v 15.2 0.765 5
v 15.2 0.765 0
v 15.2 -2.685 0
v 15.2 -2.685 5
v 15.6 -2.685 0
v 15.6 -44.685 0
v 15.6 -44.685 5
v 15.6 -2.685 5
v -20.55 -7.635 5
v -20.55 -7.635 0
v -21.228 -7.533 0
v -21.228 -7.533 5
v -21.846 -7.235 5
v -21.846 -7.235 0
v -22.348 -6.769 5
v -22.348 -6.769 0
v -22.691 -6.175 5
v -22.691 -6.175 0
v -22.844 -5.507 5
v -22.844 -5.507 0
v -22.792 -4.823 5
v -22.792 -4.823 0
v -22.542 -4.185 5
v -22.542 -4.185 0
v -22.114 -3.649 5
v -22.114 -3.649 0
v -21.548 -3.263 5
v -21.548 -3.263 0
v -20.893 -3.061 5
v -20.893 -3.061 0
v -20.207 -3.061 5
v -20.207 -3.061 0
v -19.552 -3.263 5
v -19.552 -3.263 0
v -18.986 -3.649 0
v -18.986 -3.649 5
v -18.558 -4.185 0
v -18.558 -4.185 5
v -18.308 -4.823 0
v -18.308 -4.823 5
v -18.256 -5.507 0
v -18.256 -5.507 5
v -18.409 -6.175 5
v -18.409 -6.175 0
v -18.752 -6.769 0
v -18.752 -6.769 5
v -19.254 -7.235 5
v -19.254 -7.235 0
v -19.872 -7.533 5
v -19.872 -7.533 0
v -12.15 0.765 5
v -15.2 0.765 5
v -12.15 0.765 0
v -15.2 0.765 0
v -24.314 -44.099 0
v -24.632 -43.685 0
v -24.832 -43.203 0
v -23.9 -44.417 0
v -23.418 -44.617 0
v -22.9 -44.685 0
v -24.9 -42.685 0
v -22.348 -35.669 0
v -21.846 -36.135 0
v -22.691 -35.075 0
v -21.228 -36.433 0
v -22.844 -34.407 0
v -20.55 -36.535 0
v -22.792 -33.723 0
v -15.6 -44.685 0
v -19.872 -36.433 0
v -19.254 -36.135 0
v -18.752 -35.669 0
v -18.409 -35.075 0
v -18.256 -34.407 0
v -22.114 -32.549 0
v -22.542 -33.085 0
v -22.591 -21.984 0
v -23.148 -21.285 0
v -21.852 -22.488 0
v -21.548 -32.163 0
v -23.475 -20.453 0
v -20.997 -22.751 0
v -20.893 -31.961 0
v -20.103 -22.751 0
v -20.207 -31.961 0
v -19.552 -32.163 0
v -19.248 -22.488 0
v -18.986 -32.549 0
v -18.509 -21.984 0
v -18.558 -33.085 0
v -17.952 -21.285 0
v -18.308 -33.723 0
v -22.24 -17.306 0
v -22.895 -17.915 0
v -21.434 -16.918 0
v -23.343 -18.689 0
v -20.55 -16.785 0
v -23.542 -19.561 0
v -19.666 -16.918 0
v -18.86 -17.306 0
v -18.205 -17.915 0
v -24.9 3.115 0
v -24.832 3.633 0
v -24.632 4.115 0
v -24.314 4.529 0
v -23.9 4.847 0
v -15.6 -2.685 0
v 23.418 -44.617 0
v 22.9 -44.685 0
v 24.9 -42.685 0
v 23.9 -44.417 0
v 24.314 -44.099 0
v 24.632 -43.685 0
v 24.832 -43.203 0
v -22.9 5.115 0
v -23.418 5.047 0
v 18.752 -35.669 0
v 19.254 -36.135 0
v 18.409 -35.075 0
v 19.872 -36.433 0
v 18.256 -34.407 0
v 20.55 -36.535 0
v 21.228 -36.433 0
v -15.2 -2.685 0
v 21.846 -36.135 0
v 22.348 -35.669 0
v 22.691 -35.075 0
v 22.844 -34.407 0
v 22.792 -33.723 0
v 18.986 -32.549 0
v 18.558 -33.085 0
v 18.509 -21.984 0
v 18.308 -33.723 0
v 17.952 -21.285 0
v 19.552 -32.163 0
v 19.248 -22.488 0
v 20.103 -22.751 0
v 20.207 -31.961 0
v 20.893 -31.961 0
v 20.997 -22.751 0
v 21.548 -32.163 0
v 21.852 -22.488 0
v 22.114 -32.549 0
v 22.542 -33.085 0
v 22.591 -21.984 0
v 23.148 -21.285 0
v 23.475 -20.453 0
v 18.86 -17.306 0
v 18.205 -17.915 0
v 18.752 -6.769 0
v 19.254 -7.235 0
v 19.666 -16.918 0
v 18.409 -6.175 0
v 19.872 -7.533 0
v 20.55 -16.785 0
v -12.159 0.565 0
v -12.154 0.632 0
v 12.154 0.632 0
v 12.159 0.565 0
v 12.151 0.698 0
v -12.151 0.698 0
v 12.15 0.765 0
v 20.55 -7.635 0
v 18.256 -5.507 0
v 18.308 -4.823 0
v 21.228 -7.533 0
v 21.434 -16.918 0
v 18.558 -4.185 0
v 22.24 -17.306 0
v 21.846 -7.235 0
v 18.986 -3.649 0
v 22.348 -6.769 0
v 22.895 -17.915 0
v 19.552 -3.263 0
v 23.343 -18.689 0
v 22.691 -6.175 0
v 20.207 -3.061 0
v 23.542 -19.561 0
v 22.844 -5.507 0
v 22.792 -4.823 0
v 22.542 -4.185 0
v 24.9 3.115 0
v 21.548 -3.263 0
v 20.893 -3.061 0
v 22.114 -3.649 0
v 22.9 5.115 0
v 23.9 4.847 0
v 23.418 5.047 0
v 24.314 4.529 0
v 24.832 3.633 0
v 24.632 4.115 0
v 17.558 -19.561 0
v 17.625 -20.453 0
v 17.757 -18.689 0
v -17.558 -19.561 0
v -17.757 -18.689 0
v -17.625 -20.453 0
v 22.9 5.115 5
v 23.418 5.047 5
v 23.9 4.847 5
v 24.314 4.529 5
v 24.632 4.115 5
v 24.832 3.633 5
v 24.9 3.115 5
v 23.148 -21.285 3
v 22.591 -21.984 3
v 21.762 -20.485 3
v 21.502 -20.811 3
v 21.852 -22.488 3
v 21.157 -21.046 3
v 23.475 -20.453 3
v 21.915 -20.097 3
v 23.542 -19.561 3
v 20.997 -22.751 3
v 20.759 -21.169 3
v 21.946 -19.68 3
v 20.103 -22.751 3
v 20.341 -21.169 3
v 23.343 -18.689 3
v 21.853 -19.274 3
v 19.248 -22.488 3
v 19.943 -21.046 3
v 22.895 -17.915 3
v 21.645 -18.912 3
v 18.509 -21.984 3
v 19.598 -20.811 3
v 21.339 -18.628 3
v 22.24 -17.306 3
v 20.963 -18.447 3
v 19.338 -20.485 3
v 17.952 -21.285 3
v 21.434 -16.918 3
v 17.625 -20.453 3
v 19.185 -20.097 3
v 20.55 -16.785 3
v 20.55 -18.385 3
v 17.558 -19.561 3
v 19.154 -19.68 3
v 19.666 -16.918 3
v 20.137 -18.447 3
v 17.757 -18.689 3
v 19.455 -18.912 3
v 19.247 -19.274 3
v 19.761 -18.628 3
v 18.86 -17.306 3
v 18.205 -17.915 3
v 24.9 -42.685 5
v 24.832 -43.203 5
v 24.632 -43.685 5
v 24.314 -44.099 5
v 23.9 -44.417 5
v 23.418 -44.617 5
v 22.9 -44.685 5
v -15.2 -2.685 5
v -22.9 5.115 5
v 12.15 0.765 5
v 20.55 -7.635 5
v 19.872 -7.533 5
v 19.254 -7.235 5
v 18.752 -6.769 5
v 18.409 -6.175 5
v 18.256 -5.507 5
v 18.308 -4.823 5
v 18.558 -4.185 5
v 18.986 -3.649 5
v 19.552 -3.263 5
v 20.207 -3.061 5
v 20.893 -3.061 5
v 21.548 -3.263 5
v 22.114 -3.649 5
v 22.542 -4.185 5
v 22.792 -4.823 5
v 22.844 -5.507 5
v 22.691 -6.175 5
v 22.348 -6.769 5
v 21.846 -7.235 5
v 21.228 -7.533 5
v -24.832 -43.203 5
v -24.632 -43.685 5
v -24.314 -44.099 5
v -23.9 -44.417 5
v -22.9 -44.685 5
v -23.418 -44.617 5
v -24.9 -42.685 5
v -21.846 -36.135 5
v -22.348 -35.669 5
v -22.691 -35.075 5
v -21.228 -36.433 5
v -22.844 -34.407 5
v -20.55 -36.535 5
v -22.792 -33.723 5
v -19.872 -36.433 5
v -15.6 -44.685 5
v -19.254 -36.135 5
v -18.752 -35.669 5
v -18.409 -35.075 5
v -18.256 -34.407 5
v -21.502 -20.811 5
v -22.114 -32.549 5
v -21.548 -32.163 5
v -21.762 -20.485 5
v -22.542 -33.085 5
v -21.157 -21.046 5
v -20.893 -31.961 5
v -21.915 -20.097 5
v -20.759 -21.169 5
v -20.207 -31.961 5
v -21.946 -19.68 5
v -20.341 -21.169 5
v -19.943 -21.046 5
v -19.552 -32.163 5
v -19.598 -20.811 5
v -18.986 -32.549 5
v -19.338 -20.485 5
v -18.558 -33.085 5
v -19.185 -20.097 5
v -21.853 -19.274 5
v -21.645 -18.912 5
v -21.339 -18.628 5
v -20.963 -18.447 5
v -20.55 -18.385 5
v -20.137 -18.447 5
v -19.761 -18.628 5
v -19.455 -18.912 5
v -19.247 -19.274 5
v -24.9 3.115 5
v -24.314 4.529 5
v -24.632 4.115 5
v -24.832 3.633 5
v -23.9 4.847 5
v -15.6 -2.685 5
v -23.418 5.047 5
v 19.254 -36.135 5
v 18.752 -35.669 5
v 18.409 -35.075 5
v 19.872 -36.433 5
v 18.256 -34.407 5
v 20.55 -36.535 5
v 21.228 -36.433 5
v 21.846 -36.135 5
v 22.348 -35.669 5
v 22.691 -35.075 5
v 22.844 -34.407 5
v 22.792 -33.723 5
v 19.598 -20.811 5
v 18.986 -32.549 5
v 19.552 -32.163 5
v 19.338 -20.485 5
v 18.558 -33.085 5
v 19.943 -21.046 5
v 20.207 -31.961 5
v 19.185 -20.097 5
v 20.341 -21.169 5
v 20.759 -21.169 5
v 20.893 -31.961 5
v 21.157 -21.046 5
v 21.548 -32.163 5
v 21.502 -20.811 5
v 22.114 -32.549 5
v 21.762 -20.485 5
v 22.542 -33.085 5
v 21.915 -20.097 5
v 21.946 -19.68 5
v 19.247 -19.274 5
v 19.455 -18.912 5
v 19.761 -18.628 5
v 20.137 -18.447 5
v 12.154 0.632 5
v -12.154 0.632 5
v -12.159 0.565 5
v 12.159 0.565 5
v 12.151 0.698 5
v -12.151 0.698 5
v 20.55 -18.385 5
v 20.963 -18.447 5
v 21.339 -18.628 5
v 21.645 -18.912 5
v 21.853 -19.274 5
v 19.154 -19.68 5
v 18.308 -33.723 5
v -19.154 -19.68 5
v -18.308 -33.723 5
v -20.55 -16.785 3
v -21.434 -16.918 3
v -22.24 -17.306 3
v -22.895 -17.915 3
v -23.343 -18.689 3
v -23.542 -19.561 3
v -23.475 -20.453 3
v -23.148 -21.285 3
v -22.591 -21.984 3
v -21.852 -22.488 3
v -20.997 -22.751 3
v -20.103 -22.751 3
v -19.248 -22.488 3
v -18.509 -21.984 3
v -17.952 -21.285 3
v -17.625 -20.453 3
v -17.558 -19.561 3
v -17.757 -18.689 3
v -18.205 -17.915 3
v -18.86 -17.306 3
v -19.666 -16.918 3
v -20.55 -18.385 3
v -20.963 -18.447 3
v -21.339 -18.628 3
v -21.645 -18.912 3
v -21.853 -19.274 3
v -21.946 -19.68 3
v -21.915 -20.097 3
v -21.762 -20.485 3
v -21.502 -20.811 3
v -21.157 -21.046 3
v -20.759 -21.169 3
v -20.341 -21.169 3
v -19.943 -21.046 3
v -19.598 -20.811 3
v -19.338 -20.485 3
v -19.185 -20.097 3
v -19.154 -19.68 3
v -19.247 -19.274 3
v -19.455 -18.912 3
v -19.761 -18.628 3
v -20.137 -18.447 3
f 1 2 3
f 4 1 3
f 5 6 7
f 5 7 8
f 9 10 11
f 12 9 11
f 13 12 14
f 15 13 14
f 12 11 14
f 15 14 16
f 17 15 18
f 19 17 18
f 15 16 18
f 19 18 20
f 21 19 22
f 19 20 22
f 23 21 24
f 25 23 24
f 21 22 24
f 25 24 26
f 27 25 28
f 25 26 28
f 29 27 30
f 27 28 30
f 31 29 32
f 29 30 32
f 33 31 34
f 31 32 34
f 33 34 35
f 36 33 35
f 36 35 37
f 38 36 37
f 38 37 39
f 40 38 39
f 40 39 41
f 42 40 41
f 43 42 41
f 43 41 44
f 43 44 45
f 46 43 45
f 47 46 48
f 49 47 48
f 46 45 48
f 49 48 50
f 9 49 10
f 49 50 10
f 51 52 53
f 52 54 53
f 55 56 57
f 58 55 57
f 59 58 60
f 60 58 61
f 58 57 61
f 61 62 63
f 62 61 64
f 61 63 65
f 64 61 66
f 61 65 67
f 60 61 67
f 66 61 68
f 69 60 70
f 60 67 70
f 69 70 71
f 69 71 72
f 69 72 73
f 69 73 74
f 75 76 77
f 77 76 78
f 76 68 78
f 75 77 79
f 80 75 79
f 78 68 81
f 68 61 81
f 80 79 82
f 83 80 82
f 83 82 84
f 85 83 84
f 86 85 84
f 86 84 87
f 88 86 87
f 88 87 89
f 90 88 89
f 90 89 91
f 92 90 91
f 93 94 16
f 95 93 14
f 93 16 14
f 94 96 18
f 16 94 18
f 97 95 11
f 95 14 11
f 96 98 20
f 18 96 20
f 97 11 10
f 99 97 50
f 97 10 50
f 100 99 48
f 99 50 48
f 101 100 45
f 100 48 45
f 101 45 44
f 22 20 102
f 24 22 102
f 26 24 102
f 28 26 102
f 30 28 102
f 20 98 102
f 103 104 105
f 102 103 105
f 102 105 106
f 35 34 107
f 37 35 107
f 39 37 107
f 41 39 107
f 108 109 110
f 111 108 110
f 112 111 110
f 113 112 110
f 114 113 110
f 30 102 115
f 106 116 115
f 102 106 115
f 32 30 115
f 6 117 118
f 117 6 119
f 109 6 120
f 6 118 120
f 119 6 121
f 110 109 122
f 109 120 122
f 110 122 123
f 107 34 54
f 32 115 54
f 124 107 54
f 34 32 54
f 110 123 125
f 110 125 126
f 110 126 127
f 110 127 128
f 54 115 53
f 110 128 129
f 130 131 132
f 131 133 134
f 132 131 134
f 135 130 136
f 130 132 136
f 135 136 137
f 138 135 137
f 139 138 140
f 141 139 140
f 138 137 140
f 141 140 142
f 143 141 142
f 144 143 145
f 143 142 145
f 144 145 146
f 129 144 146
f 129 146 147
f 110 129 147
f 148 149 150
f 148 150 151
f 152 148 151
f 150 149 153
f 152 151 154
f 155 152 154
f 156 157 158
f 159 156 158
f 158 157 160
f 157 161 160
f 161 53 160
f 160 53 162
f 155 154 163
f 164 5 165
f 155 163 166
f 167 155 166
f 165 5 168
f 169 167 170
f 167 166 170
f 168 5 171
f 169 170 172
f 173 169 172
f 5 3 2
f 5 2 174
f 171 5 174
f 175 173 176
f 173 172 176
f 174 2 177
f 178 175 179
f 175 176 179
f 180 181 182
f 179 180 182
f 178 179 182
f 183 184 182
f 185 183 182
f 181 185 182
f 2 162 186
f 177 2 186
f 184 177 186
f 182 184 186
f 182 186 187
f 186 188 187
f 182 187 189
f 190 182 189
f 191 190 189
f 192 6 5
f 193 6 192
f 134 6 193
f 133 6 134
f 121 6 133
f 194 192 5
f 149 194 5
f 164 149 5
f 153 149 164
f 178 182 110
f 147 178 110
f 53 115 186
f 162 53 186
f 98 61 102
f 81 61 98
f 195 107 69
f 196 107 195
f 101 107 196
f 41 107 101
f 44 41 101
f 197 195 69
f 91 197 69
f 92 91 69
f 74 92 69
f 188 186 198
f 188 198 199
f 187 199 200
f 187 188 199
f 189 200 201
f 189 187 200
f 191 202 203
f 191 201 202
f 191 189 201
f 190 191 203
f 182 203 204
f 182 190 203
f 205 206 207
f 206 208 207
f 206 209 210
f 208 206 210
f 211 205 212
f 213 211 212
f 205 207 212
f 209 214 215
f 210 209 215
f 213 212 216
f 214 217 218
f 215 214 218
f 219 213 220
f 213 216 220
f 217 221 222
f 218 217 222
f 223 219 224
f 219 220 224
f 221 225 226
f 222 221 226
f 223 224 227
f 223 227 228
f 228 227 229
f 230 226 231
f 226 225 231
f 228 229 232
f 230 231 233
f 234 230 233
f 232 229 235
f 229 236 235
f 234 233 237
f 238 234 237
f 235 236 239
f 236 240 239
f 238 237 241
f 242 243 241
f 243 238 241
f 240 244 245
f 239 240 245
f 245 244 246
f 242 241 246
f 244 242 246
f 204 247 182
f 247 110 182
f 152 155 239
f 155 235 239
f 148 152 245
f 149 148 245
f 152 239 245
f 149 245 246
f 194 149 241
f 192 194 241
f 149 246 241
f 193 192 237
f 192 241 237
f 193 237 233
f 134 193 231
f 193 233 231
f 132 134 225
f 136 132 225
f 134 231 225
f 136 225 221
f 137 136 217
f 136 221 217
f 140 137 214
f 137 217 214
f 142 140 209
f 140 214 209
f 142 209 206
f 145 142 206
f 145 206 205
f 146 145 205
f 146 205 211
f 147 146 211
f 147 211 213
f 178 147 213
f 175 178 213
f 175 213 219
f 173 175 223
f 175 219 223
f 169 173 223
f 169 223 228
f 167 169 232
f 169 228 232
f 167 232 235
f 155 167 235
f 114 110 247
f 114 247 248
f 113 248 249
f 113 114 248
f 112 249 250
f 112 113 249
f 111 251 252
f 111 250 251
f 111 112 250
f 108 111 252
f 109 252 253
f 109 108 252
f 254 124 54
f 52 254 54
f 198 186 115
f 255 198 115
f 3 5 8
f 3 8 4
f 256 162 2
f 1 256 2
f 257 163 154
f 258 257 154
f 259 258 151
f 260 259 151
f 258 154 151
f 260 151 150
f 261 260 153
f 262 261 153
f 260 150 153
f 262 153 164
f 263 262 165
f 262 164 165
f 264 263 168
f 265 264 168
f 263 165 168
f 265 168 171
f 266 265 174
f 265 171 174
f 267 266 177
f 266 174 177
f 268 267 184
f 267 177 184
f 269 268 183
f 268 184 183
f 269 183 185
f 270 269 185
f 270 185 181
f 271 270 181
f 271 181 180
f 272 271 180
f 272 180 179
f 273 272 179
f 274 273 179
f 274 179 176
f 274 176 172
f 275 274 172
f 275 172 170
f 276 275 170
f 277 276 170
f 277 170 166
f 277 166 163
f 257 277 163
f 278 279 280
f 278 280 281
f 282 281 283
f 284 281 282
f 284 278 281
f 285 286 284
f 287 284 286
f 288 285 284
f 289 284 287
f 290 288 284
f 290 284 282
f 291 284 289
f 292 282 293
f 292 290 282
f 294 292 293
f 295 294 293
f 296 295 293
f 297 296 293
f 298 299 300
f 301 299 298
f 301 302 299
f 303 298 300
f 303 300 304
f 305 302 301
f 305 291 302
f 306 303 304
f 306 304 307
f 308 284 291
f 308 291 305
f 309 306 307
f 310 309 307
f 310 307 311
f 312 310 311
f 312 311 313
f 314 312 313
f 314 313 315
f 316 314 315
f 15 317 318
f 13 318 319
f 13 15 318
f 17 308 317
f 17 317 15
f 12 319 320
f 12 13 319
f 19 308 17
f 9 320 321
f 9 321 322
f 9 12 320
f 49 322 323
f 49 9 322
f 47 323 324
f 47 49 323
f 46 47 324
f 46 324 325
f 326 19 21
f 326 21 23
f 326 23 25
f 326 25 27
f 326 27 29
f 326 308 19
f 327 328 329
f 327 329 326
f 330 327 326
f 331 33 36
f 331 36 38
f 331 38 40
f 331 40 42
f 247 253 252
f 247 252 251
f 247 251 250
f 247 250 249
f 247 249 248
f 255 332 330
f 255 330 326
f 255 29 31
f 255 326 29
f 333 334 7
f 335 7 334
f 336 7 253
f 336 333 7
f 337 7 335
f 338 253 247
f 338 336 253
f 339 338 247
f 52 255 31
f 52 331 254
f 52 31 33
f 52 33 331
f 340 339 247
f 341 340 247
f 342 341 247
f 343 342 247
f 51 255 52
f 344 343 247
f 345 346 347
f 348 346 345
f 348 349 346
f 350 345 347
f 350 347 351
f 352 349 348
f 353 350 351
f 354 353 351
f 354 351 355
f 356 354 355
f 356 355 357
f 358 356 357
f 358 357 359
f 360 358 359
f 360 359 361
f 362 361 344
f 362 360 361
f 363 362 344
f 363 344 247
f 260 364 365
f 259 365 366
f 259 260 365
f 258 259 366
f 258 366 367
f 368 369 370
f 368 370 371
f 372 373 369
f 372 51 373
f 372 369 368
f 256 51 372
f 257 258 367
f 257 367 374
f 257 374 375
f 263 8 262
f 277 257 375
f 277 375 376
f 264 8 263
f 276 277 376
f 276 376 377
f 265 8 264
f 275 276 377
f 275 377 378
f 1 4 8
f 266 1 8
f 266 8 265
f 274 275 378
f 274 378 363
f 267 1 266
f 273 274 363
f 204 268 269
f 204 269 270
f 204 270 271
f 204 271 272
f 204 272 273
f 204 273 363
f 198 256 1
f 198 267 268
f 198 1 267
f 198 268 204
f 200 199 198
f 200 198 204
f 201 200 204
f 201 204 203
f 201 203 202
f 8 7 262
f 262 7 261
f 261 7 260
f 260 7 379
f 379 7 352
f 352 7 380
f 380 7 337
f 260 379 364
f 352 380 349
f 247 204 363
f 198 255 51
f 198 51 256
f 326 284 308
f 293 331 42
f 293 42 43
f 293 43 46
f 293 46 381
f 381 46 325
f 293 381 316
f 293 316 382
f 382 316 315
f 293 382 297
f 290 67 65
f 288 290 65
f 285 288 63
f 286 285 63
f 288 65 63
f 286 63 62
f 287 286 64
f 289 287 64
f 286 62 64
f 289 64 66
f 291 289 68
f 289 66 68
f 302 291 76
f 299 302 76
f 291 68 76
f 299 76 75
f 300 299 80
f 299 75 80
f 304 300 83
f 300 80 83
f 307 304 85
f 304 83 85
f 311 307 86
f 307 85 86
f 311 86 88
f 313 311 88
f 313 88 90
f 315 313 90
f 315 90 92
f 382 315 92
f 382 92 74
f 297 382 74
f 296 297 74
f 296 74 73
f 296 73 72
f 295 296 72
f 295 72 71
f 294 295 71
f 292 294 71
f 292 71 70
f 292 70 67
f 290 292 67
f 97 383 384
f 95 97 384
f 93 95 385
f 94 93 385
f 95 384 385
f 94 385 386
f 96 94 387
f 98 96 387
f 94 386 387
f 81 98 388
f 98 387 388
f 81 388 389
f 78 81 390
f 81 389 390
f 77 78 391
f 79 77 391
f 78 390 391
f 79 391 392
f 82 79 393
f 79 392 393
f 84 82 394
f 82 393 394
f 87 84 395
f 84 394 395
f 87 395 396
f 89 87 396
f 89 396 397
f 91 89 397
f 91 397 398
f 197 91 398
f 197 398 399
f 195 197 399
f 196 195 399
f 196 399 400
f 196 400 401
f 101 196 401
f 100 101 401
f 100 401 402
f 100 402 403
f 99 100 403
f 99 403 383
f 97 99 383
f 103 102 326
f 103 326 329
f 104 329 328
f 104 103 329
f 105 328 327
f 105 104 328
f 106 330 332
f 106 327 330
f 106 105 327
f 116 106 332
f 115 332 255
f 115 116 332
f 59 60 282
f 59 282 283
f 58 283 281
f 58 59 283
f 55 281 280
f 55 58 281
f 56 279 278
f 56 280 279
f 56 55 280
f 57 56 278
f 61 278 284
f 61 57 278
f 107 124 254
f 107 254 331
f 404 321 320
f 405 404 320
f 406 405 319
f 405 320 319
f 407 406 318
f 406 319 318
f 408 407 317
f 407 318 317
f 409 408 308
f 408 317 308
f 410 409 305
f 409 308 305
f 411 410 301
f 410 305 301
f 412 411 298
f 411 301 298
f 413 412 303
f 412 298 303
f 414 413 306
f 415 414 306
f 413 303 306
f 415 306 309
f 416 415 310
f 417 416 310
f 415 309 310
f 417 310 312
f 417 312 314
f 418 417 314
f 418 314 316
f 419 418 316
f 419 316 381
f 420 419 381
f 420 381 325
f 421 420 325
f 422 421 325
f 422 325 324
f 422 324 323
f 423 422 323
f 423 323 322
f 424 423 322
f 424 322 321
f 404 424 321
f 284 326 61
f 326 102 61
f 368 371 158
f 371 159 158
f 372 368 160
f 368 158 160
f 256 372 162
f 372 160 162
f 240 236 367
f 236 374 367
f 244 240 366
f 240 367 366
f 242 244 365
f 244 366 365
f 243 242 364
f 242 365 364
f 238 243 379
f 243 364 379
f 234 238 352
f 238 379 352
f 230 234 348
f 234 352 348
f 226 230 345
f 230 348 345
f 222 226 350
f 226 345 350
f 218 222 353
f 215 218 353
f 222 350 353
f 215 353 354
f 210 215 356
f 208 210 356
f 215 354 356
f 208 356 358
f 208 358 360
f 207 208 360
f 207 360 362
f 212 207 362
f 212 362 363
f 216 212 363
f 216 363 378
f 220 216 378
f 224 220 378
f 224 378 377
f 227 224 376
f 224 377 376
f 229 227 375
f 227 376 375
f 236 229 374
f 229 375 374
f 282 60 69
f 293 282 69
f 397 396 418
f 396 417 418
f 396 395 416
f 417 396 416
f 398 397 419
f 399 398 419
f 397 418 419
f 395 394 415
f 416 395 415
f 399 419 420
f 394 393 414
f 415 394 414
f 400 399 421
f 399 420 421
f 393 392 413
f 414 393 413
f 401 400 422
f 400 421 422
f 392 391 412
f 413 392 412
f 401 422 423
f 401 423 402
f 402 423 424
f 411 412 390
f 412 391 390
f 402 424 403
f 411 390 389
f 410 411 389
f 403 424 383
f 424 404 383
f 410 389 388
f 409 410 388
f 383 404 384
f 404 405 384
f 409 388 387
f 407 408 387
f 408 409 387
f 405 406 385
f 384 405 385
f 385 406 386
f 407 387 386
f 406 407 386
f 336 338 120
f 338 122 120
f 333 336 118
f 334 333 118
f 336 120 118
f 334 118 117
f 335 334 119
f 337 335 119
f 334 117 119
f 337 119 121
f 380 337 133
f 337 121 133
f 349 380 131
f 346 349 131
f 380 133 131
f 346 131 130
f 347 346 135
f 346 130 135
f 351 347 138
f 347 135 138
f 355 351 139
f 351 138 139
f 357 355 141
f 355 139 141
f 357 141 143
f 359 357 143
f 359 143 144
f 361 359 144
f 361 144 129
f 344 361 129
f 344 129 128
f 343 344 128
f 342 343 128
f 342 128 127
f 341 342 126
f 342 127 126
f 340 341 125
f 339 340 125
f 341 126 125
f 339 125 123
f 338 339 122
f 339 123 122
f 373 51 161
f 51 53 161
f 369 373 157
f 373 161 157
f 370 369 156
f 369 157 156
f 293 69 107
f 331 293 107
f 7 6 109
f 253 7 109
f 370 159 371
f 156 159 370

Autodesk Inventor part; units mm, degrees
ref_plane "YZ Plane" through (0, 0, 0) normal (1, 0, 0) x (0, 1, 0)
ref_plane "XZ Plane" through (0, 0, 0) normal (0, 1, 0) x (-1, 0, 0)
ref_plane "XY Plane" through (0, 0, 0) normal (0, 0, 1) x (1, 0, 0)
sketch "Sketch1" plane through (0, 0, 0) normal (0, 0, 1) x (1, 0, 0)
  circle A0 centre (-21, 1.215) radius 1.4 projected
  circle A1 centre (21, 1.215) radius 1.4 projected
  arc A2 (24.9, 3.115) -> (22.9, 5.115) centre (22.9, 3.115) ccw projected
  line L0 (22.9, 5.115) -> (-22.9, 5.115) projected
  arc A3 (-22.9, 5.115) -> (-24.9, 3.115) centre (-22.9, 3.115) ccw projected
  line L1 (-24.9, 3.115) -> (-24.9, -5.115) projected
  line L2 (22.8395, -5.115) -> (24.9, -5.115) projected
  line L3 (24.9, -5.115) -> (24.9, 3.115) projected
  arc A4 (22.9, -44.685) -> (24.9, -42.685) centre (22.9, -42.685) ccw projected
  line L4 (24.9, -42.685) -> (24.9, -36.885) projected
  line L5 (24.9, -36.885) -> (17.1, -36.885) projected
  line L6 (17.1, -36.885) -> (17.1, -44.685) projected
  line L7 (17.1, -44.685) -> (22.9, -44.685) projected
  circle A5 centre (21, -40.785) radius 1.4 projected
  arc A6 (-24.9, -42.685) -> (-22.9, -44.685) centre (-22.9, -42.685) ccw projected
  line L8 (-22.9, -44.685) -> (-17.1, -44.685) projected
  line L9 (-17.1, -44.685) -> (-17.1, -36.885) projected
  line L10 (-17.1, -36.885) -> (-24.9, -36.885) projected
  line L11 (-24.9, -36.885) -> (-24.9, -42.685) projected
  circle A7 centre (-21, -40.785) radius 1.4 projected
  line L12 (24.9, 5.115) -> (-24.9, 5.115)
  line L13 (-24.9, 5.115) -> (-24.9, -44.685)
  line L14 (-24.9, -44.685) -> (24.9, -44.685)
  line L15 (24.9, -44.685) -> (24.9, 5.115)
  line L16 (17.1, -2.685) -> (-17.1, -2.685)
  line L17 (-17.1, -2.685) -> (-17.1, -36.885)
  line L18 (-17.1, -36.885) -> (17.1, -36.885)
  line L19 (17.1, -36.885) -> (17.1, -2.685)
  line L20 (17.1, -36.885) -> (17.1, -44.685)
  line L21 (-17.1, -36.885) -> (-17.1, -44.685)
  circle A8 centre (0, 1.415) radius 1.4 projected
  arc A9 (-18.2605, -5.115) -> (-22.8395, -5.115) centre (-20.55, -5.335) ccw projected
  arc A10 (22.8395, -5.115) -> (18.2605, -5.115) centre (20.55, -5.335) ccw projected
  circle A11 centre (14.45, 0.765) radius 2.3 projected
  circle A12 centre (-14.45, 0.765) radius 2.3 projected
  line L22 (-24.9, -5.115) -> (-22.8395, -5.115) projected
  line L23 (-18.2605, -5.115) -> (18.2605, -5.115) projected
  circle A13 centre (20, -39.785) radius 1.4 projected
  circle A14 centre (-20, -39.785) radius 1.4 projected
  circle A15 centre (-14.45, -40.335) radius 2.3 projected
  circle A16 centre (20.55, -34.235) radius 2.3 projected
  circle A17 centre (-20.55, -34.235) radius 2.3 projected
  circle A18 centre (14.45, -40.335) radius 2.3 projected
  arc A19 (22.9, -44.685) -> (24.9, -42.685) centre (22.9, -42.685) ccw projected
  line L24 (24.9, -42.685) -> (24.9, -4.885) projected
  line L25 (24.9, -4.885) -> (22.8055, -4.885) projected
  line L26 (17.1, -4.885) -> (17.1, -36.885) projected
  line L27 (17.1, -36.885) -> (-17.1, -36.885) projected
  line L28 (-17.1, -36.885) -> (-17.1, -4.885) projected
  line L29 (-22.8055, -4.885) -> (-24.9, -4.885) projected
  line L30 (-24.9, -4.885) -> (-24.9, -42.685) projected
  arc A20 (-24.9, -42.685) -> (-22.9, -44.685) centre (-22.9, -42.685) ccw projected
  line L31 (-22.9, -44.685) -> (22.9, -44.685) projected
  arc A21 (-22.8055, -4.885) -> (-18.2945, -4.885) centre (-20.55, -5.335) ccw projected
  arc A22 (18.2945, -4.885) -> (22.8055, -4.885) centre (20.55, -5.335) ccw projected
  line L32 (18.2945, -4.885) -> (17.1, -4.885) projected
  line L33 (-17.1, -4.885) -> (-18.2945, -4.885) projected
  line L34 (17.1, -44.685) -> (15.6, -44.685)
  line L35 (15.6, -44.685) -> (15.6, -2.685)
  line L36 (15.6, -2.685) -> (17.1, -2.685)
  line L37 (17.1, -2.685) -> (17.1, -44.685)
  line L38 (-17.1, -44.685) -> (-15.6, -44.685)
  line L39 (-15.6, -44.685) -> (-15.6, -2.685)
  line L40 (-15.6, -2.685) -> (-17.1, -2.685)
  line L41 (-17.1, -2.685) -> (-17.1, -44.685)
  line L42 (-15, -27.435) -> (15, -27.435) projected
  line L43 (15, -27.435) -> (15, 0.565) projected
  line L44 (15, 0.565) -> (-15, 0.565) projected
  line L45 (-15, 0.565) -> (-15, -27.435) projected
  circle A23 centre (0, -19.785) radius 6.5 projected
  circle A24 centre (-10, -2.435) radius 2.75 projected
  circle A25 centre (10, -2.435) radius 2.75 projected
  line L46 (15.2, 0.765) -> (15.2, -27.635)
  line L47 (15.2, -27.635) -> (-15.2, -27.635)
  line L48 (-15.2, -27.635) -> (-15.2, 0.765)
  line L49 (-15.2, 0.765) -> (15.2, 0.765)
  point P0 (0, 0)
  point P1 (-20.55, -5.335)
  point P2 (20.55, -5.335)
  point P3 (-20.55, -5.335)
  point P4 (20.55, -5.335)
  point P5 (15.2, -2.685)
  point P6 (-15.2, -2.685)
  point P7 (-12.15, 0.765)
  point P8 (-12.1587, 0.565)
  point P9 (12.1587, 0.565)
  point P10 (12.15, 0.765)
  point P11 (-15.6, -36.885)
  point P12 (15.6, -36.885)
  dimension "d0" = 7.8
  dimension "d23" = 1.5
  dimension "d24" = 1.5
  dimension "d57" = 0.2
extrude "Extrusion1" add sketch "Sketch1" along normal blind 5 contours A0 | A1 | L3 L25 A10 L32 L19 L16 L46 A11 L49 A8 A12 L48 L17 L33 A9 L29 L1 A3 L0 A2 | L3 L2 A10 L25 | L15 L5 L19 L23 A22 L2 | A10 A22 | L4 A4 L7 L6 L5 | A10 L23 L19 L32 | L29 A9 L22 L1 | L6 L14 L35 A18 L18 | L18 L35 L23 L19 | L19 L23 L35 L16 | L22 A21 L23 L17 L10 L13 | A9 A21 | L10 L9 L8 A6 L11 | L33 L17 L23 A9 | L39 A15 L14 L9 L18 | L18 L17 L23 L39 | A18 L35 | L17 L16 L39 L23 | L39 A15 | L46 L49 A11 | A12 L49 L48 | L44 A8 L49 A11 | L49 A8 L44 A12 | L44 A8 L49 | L49 A8 | A5 A13 | A13 A5 | A5 A13 | A7 A14 | A7 A14 | A14 A7 | A16 | A17 picked at (16.0467, -40.1174) picked at (-15.7428, -39.7773)
ref_plane "Arbeitsebene1" through (15.3065, -4.4785, 13.1) normal (0, 0, 1) x (0, 1, 0)
sketch "Skizze3" plane through (15.3065, -4.4785, 13.1) normal (0, 0, 1) x (0, 1, 0)
  line L0 (-0.0065, 32.6065) -> (-30.6065, 32.6065) projected
  arc A0 (1.9935, 30.6065) -> (-0.0065, 32.6065) centre (-0.0065, 30.6065) ccw projected
  line L1 (1.9935, 30.6065) -> (1.9935, 0.0065) projected
  arc A1 (-0.0065, -1.9935) -> (1.9935, 0.0065) centre (-0.0065, 0.0065) ccw projected
  line L2 (-0.0065, -1.9935) -> (-30.6065, -1.9935) projected
  arc A2 (-32.6065, 0.0065) -> (-30.6065, -1.9935) centre (-30.6065, 0.0065) ccw projected
  line L3 (-32.6065, 0.0065) -> (-32.6065, 30.6065) projected
  arc A3 (-30.6065, 32.6065) -> (-32.6065, 30.6065) centre (-30.6065, 30.6065) ccw projected
  circle A4 centre (-35.2065, 35.2065) radius 2.4 projected
  circle A5 centre (-35.8565, 29.7565) radius 2.45 projected
  circle A6 centre (-29.7565, 35.8565) radius 2.45 projected
  circle A7 centre (-35.2065, -4.5935) radius 2.4 projected
  circle A8 centre (-35.8565, 0.8565) radius 2.45 projected
  circle A9 centre (-29.7565, -5.2435) radius 2.45 projected
  circle A10 centre (4.5935, 35.2065) radius 2.4 projected
  circle A11 centre (5.2435, 29.7565) radius 2.45 projected
  circle A12 centre (-0.8565, 35.8565) radius 2.45 projected
  circle A13 centre (-0.8565, -5.2435) radius 2.45 projected
  circle A14 centre (5.2435, 0.8565) radius 2.45 projected
  circle A15 centre (4.5935, -4.5935) radius 2.4 projected
  line L4 (-10.3065, -9.6935) -> (7.6935, -9.6935) projected
  arc A16 (7.6935, -9.6935) -> (9.6935, -7.6935) centre (7.6935, -7.6935) ccw projected
  line L5 (9.6935, 10.3065) -> (9.6935, -7.6935) projected
  line L6 (9.6935, 10.3065) -> (10.5197, 10.3065) projected
  arc A17 (10.9935, 9.9665) -> (10.5197, 10.3065) centre (10.5197, 9.8065) ccw projected
  arc A18 (10.9935, 9.9665) -> (12.953, 8.3665) centre (12.953, 10.3665) ccw projected
  line L7 (12.953, 8.3665) -> (13.0935, 8.3665) projected
  arc A19 (13.0935, 8.3665) -> (15.0935, 10.3665) centre (13.0935, 10.3665) ccw projected
  line L8 (15.0935, 10.3665) -> (15.0935, 20.2465) projected
  arc A20 (15.0935, 20.2465) -> (13.0935, 22.2465) centre (13.0935, 20.2465) ccw projected
  line L9 (13.0935, 22.2465) -> (12.953, 22.2465) projected
  arc A21 (12.953, 22.2465) -> (10.9935, 20.6465) centre (12.953, 20.2465) ccw projected
  arc A22 (10.5197, 20.3065) -> (10.9935, 20.6465) centre (10.5197, 20.8065) ccw projected
  line L10 (10.5197, 20.3065) -> (9.6935, 20.3065) projected
  line L11 (9.6935, 38.3065) -> (9.6935, 20.3065) projected
  arc A23 (9.6935, 38.3065) -> (7.6935, 40.3065) centre (7.6935, 38.3065) ccw projected
  line L12 (7.6935, 40.3065) -> (-10.156, 40.3065) projected
  line L13 (-10.156, 40.3065) -> (-10.1563, 39.5805) projected
  arc A24 (-10.1563, 39.5805) -> (-9.9265, 39.2516) centre (-9.8062, 39.5805) ccw projected
  arc A25 (-8.2165, 37.1473) -> (-9.9265, 39.2516) centre (-10.3665, 37.1472) ccw projected
  line L14 (-8.2165, 37.1473) -> (-8.2165, 37.007) projected
  arc A26 (-10.3664, 34.8569) -> (-8.2165, 37.007) centre (-10.3665, 37.0069) ccw projected
  line L15 (-10.3664, 34.8569) -> (-20.25, 34.8563) projected
  arc A27 (-22.4012, 37.0074) -> (-20.25, 34.8563) centre (-20.2501, 37.0074) ccw projected
  line L16 (-22.4012, 37.0074) -> (-22.4012, 37.1472) projected
  arc A28 (-20.6871, 39.2564) -> (-22.4012, 37.1472) centre (-20.2465, 37.1472) ccw projected
  arc A29 (-20.6871, 39.2564) -> (-20.4574, 39.5808) centre (-20.8064, 39.5844) ccw projected
  line L17 (-20.4574, 39.5808) -> (-20.4576, 40.3065) projected
  line L18 (-20.4576, 40.3065) -> (-38.3065, 40.3065) projected
  arc A30 (-38.3065, 40.3065) -> (-40.3065, 38.3065) centre (-38.3065, 38.3065) ccw projected
  line L19 (-40.3065, 20.4571) -> (-40.3065, 38.3065) projected
  line L20 (-40.3065, 20.4571) -> (-39.5805, 20.4567) projected
  arc A31 (-39.5805, 20.4567) -> (-39.2516, 20.6865) centre (-39.5805, 20.8069) ccw projected
  arc A32 (-37.1473, 22.3966) -> (-39.2516, 20.6865) centre (-37.1472, 20.2466) ccw projected
  line L21 (-37.1473, 22.3966) -> (-37.007, 22.3966) projected
  arc A33 (-34.8569, 20.2467) -> (-37.007, 22.3966) centre (-37.0069, 20.2466) ccw projected
  line L22 (-34.8569, 20.2467) -> (-34.8563, 10.3631) projected
  arc A34 (-37.0074, 8.2119) -> (-34.8563, 10.3631) centre (-37.0074, 10.363) ccw projected
  line L23 (-37.0074, 8.2119) -> (-37.1472, 8.2119) projected
  arc A35 (-39.2564, 9.9259) -> (-37.1472, 8.2119) centre (-37.1472, 10.3665) ccw projected
  arc A36 (-39.2564, 9.9259) -> (-39.5808, 10.1556) centre (-39.5844, 9.8067) ccw projected
  line L24 (-39.5808, 10.1556) -> (-40.3065, 10.1554) projected
  line L25 (-40.3065, -7.6935) -> (-40.3065, 10.1554) projected
  arc A37 (-40.3065, -7.6935) -> (-38.3065, -9.6935) centre (-38.3065, -7.6935) ccw projected
  line L26 (-38.3065, -9.6935) -> (-20.3065, -9.6935) projected
  line L27 (-20.3065, -9.6935) -> (-20.3065, -10.5197) projected
  arc A38 (-20.6465, -10.9935) -> (-20.3065, -10.5197) centre (-20.8065, -10.5197) ccw projected
  arc A39 (-20.6465, -10.9935) -> (-22.2465, -12.953) centre (-20.2465, -12.953) ccw projected
  line L28 (-22.2465, -12.953) -> (-22.2465, -13.0935) projected
  arc A40 (-22.2465, -13.0935) -> (-20.2465, -15.0935) centre (-20.2465, -13.0935) ccw projected
  line L29 (-20.2465, -15.0935) -> (-10.3665, -15.0935) projected
  arc A41 (-10.3665, -15.0935) -> (-8.3665, -13.0935) centre (-10.3665, -13.0935) ccw projected
  line L30 (-8.3665, -13.0935) -> (-8.3665, -12.953) projected
  arc A42 (-8.3665, -12.953) -> (-9.9665, -10.9935) centre (-10.3665, -12.953) ccw projected
  arc A43 (-10.3065, -10.5197) -> (-9.9665, -10.9935) centre (-9.8065, -10.5197) ccw projected
  line L31 (-10.3065, -10.5197) -> (-10.3065, -9.6935) projected
  circle A44 centre (-15.4065, -5.9935) radius 2.15 projected
  circle A45 centre (5.9935, 15.2065) radius 2.15 projected
  point P0 (4.4785, 15.3065)
hole "Bohrung1" at (-20.55, -34.235, 13.1) at (-20.55, -5.335, 13.1) at (20.55, -5.335, 13.1) at (20.55, -34.235, 13.1) direction (0, 0, -1) diameter 4.6 end through all
sketch "Skizze10" plane through (0, 0, 0) normal (0, 0, -1) x (-1, 0, 0)
  circle A0 centre (-20.55, -19.785) radius 1.4 projected
  circle A1 centre (20.55, -19.785) radius 1.4 projected
  point P0 (0, 0)
hole "Bohrung5" at (20.55, -19.785, 0) at (-20.55, -19.785, 0) direction (0, 0, 1) diameter 2.8 end through all counterbore diameter 6 counterbore depth 3
properties part number "30_Linear_Stage_NEMA11_China_lid_universal_extender_v2"
